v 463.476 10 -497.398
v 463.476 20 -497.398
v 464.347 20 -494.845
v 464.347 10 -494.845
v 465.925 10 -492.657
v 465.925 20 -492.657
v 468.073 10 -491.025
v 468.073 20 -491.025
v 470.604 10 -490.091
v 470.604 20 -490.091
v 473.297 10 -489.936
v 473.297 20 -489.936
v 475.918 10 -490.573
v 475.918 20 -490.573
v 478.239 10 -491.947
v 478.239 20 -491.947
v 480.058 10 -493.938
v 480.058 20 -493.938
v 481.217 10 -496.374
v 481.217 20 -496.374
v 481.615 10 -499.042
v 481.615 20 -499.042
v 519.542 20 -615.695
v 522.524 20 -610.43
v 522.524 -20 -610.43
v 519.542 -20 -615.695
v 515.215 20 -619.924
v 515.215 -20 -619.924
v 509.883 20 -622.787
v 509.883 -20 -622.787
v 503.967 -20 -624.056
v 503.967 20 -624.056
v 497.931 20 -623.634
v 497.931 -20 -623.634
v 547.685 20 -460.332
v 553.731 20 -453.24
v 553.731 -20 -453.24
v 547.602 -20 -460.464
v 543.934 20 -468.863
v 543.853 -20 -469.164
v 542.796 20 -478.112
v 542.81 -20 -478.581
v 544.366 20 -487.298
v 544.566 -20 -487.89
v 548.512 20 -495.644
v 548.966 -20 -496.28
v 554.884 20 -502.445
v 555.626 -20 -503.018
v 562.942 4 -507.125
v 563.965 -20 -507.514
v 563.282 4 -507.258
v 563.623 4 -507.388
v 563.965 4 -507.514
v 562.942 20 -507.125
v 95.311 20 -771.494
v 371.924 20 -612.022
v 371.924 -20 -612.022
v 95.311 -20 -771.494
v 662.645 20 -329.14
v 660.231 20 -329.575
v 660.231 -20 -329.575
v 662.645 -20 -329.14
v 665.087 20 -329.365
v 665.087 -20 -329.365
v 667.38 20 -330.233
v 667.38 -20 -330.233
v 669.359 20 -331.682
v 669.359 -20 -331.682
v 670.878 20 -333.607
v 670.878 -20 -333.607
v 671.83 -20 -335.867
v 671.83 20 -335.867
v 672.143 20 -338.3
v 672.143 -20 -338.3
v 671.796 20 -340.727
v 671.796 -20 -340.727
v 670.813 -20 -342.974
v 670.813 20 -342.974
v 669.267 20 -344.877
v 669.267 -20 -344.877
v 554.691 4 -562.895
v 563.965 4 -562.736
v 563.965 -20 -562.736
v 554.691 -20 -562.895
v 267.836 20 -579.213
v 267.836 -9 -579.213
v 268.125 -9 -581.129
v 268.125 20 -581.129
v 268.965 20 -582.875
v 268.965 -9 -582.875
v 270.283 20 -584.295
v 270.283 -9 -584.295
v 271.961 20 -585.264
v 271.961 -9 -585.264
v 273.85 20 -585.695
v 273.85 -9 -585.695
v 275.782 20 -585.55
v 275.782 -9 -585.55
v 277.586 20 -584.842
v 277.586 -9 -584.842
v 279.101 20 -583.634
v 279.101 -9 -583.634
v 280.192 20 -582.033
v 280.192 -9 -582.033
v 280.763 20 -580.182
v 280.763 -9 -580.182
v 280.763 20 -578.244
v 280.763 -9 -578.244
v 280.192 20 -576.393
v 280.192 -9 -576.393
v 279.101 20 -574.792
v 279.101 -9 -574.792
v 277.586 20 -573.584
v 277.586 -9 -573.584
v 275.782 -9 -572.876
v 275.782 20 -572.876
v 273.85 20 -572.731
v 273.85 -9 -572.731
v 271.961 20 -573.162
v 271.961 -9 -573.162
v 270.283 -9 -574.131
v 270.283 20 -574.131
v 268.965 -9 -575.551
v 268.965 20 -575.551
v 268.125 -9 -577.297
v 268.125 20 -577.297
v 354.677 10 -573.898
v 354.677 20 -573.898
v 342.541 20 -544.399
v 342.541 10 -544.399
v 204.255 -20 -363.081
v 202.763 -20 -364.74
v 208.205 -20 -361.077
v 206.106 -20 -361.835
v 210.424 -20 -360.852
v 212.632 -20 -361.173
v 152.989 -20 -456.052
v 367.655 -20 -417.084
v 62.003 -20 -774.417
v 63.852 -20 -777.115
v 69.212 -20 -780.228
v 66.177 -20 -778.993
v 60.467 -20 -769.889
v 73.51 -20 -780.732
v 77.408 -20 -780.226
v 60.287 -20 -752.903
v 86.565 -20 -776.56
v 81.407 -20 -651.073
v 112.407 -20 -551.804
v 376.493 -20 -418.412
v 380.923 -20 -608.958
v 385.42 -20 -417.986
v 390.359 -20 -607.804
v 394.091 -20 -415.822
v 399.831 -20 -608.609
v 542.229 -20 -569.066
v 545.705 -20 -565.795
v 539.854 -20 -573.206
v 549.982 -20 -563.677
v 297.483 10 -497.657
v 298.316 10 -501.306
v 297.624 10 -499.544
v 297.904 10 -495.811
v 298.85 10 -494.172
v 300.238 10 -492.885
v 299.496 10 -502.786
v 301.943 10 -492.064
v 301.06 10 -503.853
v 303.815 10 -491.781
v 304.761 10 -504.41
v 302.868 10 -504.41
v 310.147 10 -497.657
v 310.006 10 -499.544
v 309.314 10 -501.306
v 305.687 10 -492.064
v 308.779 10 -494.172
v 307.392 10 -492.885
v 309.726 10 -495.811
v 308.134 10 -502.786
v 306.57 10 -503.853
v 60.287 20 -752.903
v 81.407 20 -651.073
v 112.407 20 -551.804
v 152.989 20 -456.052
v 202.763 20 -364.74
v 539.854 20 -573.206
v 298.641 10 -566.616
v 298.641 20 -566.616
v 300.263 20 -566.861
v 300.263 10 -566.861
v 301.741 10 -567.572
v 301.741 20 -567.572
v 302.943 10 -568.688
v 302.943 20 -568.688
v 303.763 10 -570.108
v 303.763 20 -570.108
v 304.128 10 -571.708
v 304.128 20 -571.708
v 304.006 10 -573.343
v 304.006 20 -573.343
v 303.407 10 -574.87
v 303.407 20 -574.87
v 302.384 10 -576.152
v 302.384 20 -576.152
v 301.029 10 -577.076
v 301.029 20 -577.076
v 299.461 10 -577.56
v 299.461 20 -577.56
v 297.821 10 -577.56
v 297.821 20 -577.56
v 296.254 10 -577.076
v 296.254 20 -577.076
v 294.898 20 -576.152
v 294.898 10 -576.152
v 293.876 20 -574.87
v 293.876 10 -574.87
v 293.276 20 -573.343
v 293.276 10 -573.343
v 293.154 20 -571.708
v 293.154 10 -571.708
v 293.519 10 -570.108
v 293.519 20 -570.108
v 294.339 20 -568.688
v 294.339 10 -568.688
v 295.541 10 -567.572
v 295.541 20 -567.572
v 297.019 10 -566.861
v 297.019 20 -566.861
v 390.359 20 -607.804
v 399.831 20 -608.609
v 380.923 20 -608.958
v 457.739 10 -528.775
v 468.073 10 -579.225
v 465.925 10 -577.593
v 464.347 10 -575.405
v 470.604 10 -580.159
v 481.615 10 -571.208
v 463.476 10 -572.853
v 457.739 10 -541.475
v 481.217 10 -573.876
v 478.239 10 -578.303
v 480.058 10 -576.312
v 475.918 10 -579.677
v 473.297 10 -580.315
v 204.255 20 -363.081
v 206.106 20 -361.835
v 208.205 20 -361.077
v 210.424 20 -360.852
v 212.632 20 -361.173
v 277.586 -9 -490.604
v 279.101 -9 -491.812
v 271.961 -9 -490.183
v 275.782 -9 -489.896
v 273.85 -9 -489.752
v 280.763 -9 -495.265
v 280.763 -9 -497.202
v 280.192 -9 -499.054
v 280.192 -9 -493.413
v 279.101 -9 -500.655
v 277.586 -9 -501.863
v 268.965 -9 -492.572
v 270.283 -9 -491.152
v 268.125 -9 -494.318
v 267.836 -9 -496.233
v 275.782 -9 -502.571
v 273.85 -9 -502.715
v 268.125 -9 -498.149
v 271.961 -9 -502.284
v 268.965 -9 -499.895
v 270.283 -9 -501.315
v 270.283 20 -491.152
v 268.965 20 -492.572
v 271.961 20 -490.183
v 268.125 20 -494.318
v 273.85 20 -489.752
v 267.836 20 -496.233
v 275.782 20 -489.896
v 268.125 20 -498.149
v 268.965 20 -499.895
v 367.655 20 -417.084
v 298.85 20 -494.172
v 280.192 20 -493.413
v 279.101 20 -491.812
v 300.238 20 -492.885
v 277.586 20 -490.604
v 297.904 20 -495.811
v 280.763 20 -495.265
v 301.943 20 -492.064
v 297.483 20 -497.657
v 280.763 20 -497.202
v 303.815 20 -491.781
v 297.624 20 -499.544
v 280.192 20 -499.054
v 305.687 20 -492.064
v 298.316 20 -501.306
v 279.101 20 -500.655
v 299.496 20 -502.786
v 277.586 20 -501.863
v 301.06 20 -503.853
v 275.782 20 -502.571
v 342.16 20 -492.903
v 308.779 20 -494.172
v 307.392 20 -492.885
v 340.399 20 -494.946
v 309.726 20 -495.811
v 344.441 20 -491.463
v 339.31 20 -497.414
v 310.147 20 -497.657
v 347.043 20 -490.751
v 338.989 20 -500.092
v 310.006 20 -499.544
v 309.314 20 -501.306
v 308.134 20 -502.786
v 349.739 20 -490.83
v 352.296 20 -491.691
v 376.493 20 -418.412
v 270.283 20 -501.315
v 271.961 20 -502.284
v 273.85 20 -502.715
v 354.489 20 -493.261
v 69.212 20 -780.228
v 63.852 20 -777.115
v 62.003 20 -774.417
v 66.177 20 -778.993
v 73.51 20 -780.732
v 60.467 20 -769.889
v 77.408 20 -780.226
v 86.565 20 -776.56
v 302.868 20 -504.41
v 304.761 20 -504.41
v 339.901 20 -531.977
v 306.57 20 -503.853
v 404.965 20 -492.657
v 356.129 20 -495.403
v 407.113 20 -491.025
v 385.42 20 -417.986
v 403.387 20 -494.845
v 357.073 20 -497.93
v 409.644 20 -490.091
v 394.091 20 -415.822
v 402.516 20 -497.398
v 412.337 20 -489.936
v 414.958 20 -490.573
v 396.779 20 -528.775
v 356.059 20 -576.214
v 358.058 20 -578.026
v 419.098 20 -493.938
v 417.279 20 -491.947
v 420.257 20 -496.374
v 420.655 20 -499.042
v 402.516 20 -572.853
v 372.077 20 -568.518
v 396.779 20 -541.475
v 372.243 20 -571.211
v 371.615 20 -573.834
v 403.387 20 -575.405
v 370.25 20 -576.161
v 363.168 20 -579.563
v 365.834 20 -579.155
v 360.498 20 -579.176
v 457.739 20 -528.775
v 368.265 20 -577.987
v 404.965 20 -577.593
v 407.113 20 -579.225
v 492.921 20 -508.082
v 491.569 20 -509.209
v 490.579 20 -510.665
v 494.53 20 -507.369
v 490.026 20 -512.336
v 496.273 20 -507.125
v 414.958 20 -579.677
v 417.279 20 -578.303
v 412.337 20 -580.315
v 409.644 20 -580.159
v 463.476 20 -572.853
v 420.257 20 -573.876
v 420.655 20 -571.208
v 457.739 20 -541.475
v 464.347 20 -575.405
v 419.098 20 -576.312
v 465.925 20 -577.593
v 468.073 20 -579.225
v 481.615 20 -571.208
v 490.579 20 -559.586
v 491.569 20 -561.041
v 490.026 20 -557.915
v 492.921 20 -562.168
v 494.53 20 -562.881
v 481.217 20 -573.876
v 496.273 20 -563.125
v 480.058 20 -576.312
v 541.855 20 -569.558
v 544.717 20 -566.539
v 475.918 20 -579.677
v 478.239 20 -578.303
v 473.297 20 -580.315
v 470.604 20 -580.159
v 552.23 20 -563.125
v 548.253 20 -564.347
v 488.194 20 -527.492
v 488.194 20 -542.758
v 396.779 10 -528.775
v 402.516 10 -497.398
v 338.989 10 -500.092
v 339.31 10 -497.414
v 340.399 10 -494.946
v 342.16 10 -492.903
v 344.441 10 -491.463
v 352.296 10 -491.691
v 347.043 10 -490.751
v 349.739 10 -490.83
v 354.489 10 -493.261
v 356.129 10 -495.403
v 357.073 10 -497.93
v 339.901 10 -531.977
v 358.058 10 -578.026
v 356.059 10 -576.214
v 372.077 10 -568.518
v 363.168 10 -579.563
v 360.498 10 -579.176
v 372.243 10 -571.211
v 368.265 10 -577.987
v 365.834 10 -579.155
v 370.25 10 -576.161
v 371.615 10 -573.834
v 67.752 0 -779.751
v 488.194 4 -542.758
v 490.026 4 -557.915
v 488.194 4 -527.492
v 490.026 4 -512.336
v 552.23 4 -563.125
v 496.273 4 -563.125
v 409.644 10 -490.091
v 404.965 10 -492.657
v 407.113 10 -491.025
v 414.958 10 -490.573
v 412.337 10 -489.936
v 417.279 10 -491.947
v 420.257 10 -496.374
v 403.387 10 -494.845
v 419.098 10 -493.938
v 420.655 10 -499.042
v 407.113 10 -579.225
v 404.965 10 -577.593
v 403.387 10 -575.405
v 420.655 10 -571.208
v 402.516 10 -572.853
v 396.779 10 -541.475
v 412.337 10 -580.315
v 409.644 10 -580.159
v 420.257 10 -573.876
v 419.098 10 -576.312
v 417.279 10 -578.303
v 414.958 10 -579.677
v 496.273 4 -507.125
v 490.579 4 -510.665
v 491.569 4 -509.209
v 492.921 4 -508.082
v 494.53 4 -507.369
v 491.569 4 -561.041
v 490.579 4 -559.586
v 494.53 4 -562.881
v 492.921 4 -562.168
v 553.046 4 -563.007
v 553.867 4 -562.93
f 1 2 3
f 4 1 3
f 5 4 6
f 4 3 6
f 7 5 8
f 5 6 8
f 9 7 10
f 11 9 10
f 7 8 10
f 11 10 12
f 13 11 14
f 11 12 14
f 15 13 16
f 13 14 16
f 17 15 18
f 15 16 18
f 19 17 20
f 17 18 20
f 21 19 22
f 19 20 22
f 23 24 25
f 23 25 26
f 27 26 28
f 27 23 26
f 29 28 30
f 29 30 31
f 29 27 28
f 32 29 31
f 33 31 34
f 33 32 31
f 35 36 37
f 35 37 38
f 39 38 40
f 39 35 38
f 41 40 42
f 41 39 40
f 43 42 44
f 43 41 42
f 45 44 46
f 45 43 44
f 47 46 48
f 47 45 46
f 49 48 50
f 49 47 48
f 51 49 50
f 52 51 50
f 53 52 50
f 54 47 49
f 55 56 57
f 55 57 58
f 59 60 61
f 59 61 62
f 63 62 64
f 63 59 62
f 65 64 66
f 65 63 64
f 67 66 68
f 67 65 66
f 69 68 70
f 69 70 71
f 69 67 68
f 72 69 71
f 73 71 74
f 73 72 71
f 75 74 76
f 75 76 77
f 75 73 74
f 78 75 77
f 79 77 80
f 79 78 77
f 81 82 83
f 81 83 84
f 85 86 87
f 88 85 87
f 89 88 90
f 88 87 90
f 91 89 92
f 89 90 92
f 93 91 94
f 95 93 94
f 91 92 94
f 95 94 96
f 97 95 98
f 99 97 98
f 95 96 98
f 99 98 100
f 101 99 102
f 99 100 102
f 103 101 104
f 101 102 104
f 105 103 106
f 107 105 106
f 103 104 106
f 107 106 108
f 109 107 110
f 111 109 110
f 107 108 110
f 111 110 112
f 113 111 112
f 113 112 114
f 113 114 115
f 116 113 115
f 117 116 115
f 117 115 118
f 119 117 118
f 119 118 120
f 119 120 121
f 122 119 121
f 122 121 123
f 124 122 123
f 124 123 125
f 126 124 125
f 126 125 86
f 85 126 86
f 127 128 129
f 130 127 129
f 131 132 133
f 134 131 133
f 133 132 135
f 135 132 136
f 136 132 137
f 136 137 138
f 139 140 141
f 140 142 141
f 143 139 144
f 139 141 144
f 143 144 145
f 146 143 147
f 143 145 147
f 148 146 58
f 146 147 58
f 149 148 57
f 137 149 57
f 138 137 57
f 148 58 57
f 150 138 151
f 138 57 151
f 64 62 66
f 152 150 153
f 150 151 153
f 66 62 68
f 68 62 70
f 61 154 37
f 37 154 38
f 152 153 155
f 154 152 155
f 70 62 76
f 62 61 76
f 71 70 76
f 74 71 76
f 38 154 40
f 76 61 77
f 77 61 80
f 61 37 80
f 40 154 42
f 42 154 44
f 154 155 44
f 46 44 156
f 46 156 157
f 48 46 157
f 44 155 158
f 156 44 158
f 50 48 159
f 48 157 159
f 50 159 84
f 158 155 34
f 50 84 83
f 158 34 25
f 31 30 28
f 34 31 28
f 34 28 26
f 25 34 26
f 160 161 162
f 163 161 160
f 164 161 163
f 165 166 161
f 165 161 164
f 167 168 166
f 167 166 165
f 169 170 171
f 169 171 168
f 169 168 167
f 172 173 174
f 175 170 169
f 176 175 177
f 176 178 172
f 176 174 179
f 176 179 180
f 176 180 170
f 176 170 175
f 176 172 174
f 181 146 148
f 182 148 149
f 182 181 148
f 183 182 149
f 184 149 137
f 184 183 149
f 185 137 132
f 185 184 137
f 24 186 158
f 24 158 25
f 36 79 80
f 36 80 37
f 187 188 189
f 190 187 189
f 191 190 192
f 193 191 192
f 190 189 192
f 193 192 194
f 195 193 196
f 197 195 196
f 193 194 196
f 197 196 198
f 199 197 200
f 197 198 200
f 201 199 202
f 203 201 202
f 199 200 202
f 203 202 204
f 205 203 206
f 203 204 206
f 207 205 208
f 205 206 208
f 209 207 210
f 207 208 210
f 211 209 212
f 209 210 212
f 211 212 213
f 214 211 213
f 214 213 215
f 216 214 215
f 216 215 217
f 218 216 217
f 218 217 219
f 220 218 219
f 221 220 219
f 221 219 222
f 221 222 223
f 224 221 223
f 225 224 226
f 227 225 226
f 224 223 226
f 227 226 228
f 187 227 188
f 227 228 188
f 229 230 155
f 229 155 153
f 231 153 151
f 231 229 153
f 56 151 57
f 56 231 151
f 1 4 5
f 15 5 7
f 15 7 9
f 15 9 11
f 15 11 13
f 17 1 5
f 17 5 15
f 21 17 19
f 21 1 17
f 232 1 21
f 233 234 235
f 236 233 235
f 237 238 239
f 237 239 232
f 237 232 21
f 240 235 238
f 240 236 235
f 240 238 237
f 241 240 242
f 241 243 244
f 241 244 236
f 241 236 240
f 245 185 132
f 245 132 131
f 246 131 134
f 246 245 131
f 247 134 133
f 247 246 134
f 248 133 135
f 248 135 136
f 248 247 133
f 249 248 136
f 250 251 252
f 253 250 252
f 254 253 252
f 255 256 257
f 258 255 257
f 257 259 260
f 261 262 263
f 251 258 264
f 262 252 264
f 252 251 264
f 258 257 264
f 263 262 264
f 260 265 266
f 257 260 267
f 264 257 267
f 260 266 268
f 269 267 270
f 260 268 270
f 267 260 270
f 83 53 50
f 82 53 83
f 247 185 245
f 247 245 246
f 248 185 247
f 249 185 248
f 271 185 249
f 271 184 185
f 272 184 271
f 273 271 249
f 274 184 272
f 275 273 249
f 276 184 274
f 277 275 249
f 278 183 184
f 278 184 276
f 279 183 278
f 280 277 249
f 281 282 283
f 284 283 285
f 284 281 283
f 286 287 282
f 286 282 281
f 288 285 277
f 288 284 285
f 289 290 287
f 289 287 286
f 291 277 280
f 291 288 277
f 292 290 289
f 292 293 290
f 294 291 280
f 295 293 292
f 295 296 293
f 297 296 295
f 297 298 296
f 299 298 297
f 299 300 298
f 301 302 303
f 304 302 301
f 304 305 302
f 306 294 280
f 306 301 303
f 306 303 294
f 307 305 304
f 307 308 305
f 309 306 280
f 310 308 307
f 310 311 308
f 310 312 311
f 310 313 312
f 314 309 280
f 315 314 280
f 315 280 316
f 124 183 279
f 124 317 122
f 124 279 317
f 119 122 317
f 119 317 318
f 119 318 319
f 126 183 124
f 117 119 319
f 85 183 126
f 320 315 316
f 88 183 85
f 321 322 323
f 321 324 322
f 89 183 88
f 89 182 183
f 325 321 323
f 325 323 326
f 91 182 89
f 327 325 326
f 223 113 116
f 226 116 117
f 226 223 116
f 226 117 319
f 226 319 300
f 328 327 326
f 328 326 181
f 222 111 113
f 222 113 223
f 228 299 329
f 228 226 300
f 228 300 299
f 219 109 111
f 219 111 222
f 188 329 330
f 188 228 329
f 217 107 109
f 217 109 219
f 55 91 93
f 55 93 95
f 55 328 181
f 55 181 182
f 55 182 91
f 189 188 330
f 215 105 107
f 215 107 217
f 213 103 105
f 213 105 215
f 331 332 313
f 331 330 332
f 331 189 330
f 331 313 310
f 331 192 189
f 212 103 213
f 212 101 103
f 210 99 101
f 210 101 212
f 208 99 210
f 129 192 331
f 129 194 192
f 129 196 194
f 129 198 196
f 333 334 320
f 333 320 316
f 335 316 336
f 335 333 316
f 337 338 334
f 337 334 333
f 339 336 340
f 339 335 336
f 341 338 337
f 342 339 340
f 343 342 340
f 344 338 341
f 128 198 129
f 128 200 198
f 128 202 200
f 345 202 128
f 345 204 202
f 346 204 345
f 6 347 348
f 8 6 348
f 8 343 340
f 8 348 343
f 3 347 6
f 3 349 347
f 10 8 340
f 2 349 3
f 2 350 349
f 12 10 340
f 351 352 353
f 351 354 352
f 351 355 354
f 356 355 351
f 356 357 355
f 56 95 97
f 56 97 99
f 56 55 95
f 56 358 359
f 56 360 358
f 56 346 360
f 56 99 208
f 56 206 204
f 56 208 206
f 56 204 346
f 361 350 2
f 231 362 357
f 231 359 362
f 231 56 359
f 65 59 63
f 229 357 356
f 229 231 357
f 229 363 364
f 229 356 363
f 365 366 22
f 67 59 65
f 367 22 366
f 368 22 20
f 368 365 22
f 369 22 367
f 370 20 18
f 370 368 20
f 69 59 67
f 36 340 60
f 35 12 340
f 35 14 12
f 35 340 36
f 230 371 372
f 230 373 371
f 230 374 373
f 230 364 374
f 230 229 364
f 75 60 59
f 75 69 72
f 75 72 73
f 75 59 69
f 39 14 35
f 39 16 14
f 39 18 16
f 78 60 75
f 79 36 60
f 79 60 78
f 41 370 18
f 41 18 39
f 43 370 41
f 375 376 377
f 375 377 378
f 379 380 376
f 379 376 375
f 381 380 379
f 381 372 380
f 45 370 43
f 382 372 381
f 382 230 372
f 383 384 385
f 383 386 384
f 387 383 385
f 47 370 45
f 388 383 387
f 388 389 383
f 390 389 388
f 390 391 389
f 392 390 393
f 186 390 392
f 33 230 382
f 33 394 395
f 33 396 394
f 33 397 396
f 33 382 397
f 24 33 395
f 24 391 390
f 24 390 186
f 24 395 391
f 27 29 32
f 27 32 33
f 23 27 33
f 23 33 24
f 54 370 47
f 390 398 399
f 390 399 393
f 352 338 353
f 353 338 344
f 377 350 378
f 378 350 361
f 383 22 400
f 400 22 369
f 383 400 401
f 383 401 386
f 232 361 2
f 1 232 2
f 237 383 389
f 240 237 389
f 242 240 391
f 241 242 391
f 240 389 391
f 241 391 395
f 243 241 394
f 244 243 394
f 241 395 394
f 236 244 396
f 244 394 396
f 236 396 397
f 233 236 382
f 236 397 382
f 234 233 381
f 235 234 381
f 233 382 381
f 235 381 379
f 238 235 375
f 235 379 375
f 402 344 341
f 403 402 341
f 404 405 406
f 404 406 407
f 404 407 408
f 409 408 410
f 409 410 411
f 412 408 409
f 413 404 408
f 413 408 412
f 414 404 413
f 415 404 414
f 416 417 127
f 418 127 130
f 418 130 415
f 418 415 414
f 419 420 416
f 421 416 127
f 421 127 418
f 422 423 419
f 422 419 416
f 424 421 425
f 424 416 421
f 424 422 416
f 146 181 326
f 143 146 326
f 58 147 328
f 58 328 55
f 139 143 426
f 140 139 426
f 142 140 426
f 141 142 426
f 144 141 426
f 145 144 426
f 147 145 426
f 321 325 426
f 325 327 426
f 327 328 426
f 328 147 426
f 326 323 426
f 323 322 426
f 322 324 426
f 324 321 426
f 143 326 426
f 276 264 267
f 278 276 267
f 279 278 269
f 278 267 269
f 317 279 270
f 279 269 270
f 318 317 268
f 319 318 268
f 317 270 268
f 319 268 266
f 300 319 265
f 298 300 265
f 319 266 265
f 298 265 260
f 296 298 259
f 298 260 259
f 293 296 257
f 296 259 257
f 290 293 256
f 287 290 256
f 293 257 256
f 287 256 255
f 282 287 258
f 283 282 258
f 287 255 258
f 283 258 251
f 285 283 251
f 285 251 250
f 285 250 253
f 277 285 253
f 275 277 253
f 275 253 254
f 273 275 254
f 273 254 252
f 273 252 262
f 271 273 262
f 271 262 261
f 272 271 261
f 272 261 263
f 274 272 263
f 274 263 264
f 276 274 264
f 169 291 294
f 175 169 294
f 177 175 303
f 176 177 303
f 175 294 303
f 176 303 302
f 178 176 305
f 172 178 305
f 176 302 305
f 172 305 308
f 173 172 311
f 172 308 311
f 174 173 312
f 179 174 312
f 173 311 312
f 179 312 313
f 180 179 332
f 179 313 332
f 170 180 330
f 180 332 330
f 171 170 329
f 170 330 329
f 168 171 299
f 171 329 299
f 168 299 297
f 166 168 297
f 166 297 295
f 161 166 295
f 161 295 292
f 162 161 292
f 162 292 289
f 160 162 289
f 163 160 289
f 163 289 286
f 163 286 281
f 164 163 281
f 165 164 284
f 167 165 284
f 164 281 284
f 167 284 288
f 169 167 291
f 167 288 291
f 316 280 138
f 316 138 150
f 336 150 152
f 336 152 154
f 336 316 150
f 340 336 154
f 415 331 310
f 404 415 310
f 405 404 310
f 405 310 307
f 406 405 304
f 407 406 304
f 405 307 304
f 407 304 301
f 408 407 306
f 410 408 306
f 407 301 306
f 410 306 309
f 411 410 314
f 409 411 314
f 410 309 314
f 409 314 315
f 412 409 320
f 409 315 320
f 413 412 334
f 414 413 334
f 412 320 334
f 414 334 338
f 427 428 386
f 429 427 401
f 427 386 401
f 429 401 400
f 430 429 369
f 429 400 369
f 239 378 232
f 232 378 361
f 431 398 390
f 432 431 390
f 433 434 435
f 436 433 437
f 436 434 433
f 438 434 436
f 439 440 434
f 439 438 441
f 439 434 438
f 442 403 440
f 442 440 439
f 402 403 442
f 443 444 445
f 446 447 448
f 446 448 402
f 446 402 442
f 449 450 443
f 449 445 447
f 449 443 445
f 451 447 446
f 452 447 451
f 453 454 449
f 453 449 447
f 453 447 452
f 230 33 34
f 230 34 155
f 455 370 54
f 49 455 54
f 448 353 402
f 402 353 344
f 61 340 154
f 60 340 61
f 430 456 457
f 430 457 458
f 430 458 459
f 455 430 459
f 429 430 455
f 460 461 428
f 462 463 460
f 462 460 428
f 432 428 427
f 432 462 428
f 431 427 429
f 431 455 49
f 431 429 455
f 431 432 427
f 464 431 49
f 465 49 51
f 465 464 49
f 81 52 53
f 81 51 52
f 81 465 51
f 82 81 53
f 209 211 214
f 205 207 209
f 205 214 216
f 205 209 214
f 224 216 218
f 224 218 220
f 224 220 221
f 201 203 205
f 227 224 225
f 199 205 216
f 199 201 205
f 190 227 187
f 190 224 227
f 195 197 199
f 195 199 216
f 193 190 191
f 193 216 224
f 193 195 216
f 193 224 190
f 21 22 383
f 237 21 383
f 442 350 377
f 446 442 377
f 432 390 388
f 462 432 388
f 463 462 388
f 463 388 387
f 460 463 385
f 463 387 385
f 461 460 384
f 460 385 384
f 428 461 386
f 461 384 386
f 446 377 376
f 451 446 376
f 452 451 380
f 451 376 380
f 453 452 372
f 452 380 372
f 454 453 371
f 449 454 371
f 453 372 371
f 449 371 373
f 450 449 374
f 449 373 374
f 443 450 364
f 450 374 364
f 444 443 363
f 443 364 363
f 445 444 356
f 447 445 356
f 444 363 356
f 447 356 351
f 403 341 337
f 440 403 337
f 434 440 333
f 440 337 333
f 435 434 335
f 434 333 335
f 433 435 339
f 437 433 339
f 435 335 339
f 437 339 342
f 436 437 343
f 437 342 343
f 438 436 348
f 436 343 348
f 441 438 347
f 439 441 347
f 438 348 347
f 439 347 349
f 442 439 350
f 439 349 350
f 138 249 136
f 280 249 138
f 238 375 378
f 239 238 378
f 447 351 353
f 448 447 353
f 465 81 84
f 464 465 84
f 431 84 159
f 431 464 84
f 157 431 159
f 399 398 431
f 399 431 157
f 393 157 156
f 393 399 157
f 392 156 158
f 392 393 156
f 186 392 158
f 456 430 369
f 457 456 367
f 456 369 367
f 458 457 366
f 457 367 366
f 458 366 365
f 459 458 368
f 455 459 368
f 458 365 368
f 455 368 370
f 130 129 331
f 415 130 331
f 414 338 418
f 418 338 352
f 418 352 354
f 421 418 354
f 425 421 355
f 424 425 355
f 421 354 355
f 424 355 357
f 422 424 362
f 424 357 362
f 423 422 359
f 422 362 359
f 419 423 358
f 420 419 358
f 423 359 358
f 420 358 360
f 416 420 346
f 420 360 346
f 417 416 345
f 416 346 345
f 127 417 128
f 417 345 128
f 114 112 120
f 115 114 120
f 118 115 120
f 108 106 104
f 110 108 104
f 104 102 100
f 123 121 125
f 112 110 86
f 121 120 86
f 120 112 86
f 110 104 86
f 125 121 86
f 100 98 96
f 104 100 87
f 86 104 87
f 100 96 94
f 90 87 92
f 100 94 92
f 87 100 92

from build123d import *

# Parameters (mm, degrees)
BOSS_EXTRUDE1_DEPTH            = 40
F_13_0_13_DIAMETER_HOLE1_D     = 13
F_13_0_13_DIAMETER_HOLE1_DEPTH = 29
CUT_EXTRUDE8_DEPTH             = 16
SKETCH14_R                     = 6.35
SKETCH14_R_2                   = 5.502637429
CUT_EXTRUDE9_DEPTH             = 10
CUT_EXTRUDE10_DEPTH            = 10


with BuildPart() as part:
    # Sketch1 → Boss-Extrude1 (new body)
    with BuildSketch(Plane(origin=(0, 20, 0), x_dir=(1, 0, 0), z_dir=(0, 1, 0))):
        with BuildLine():
            Line((563.96485174, 507.513718698), (563.96485174, 562.736423486))
            Line((563.96485174, 562.736423486), (554.690781869, 562.894803628))
            ThreePointArc((554.690781869, 562.894803628), (545.704943994, 565.795150829), (539.853906856, 573.206133263))
            Line((539.853906856, 573.206133263), (522.524343645, 610.429990226))
            ThreePointArc((522.524343645, 610.429990226), (512.649800976, 621.543175495), (497.931198247, 623.634159339))
            Line((497.931198247, 623.634159339), (399.830947056, 608.608698386))
            ThreePointArc((399.830947056, 608.608698386), (385.610832142, 608.137408426), (371.923585817, 612.02238853))
            Line((371.923585817, 612.02238853), (95.310746964, 771.494097008))
            add(Edge.make_bspline(
                [(60.287007155, 752.902507236), (59.408683029, 762.769524202), (58.560960325, 776.204376236), (76.94287295, 783.298520304), (86.753146937, 776.493697586), (95.310746964, 771.494097008)],
                knots=[0, 0, 0, 0, 0.5, 0.5, 1, 1, 1, 1], degree=3))
            ThreePointArc((60.287007155, 752.902507236), (112.407005996, 551.803928099), (202.762947005, 364.739937083))
            ThreePointArc((202.762947005, 364.739937083), (207.132055784, 361.391783138), (212.632195034, 361.173346422))
            Line((212.632195034, 361.173346422), (367.65464082, 417.084401042))
            ThreePointArc((367.65464082, 417.084401042), (380.966681082, 418.419109504), (394.090964942, 415.82198883))
            Line((394.090964942, 415.82198883), (660.231475403, 329.574923038))
            ThreePointArc((660.231475403, 329.574923038), (670.878462163, 333.606992627), (669.266978502, 344.877264703))
            Line((669.266978502, 344.877264703), (553.73117364, 453.239940989))
            ThreePointArc((553.73117364, 453.239940989), (543.342125743, 483.300566911), (563.96485174, 507.513718698))
        make_face()
    extrude(amount=-BOSS_EXTRUDE1_DEPTH)

    # Ø13.0 (13) Diameter Hole1
    with Locations(Plane(origin=(0, 20, 0), x_dir=(1, 0, 0), z_dir=(0, 1, 0))):
        with Locations((274.335910331, 496.233480955), (274.335910331, 579.213058938)):
            Hole(F_13_0_13_DIAMETER_HOLE1_D / 2, depth=F_13_0_13_DIAMETER_HOLE1_DEPTH)

    # Sketch13 → Cut-Extrude8 (cut)
    with BuildSketch(Plane(origin=(0, 20, 0), x_dir=(1, 0, 0), z_dir=(0, 1, 0))):
        with BuildLine():
            Line((563.96485174, 563.125071092), (496.273234513, 563.125071092))
            ThreePointArc((496.273234513, 563.125071092), (492.20587406, 561.651450789), (490.026307291, 557.914544776))
            ThreePointArc((490.026307291, 557.914544776), (487.96485174, 535.125071092), (490.026307291, 512.335597408))
            ThreePointArc((490.026307291, 512.335597408), (492.20587406, 508.598691395), (496.273234513, 507.125071092))
            Line((496.273234513, 507.125071092), (563.96485174, 507.125071092))
            Line((563.96485174, 507.125071092), (563.96485174, 563.125071092))
        make_face()
    extrude(amount=-CUT_EXTRUDE8_DEPTH, mode=Mode.SUBTRACT)

    # Sketch14 → Cut-Extrude9 (cut)
    with BuildSketch(Plane(origin=(0, 20, 0), x_dir=(1, 0, 0), z_dir=(0, 1, 0))):
        with Locations(Location((303.81485174, 498.131405852, 0), (0, 0, 270))):
            Circle(SKETCH14_R)
        with Locations(Location((298.641153596, 572.118736332, 0), (0, 0, 270))):
            Circle(SKETCH14_R_2)
    extrude(amount=-CUT_EXTRUDE9_DEPTH, mode=Mode.SUBTRACT)

    # Sketch17 → Cut-Extrude10 (cut)
    with BuildSketch(Plane(origin=(0, 20, 0), x_dir=(1, 0, 0), z_dir=(0, 1, 0))):
        with BuildLine():
            Line((481.61485174, 499.042173829), (481.61485174, 571.207968354))
            ThreePointArc((481.61485174, 571.207968354), (473.296544122, 580.314612527), (463.475969831, 572.852606745))
            Line((463.475969831, 572.852606745), (457.73885174, 541.475071092))
            Line((457.73885174, 541.475071092), (457.73885174, 528.775071092))
            Line((457.73885174, 528.775071092), (463.475969831, 497.397535439))
            ThreePointArc((463.475969831, 497.397535439), (473.296544122, 489.935529657), (481.61485174, 499.042173829))
        make_face()
        with BuildLine():
            Line((420.65485174, 499.042173829), (420.65485174, 571.207968354))
            ThreePointArc((420.65485174, 571.207968354), (412.336544122, 580.314612527), (402.515969831, 572.852606745))
            Line((402.515969831, 572.852606745), (396.77885174, 541.475071092))
            Line((396.77885174, 541.475071092), (396.77885174, 528.775071092))
            Line((396.77885174, 528.775071092), (402.515969831, 497.397535439))
            ThreePointArc((402.515969831, 497.397535439), (412.336544122, 489.935529657), (420.65485174, 499.042173829))
        make_face()
        with BuildLine():
            Line((357.072977222, 497.929527206), (372.077089581, 568.518325976))
            ThreePointArc((372.077089581, 568.518325976), (365.83393473, 579.155441526), (354.67652531, 573.898310679))
            Line((354.67652531, 573.898310679), (342.541020523, 544.399263386))
            Line((342.541020523, 544.399263386), (339.90054205, 531.976788856))
            Line((339.90054205, 531.976788856), (338.988533854, 500.092113718))
            ThreePointArc((338.988533854, 500.092113718), (347.043066796, 490.751358459), (357.072977222, 497.929527206))
        make_face()
    extrude(amount=-CUT_EXTRUDE10_DEPTH, mode=Mode.SUBTRACT)


solid = part.part
